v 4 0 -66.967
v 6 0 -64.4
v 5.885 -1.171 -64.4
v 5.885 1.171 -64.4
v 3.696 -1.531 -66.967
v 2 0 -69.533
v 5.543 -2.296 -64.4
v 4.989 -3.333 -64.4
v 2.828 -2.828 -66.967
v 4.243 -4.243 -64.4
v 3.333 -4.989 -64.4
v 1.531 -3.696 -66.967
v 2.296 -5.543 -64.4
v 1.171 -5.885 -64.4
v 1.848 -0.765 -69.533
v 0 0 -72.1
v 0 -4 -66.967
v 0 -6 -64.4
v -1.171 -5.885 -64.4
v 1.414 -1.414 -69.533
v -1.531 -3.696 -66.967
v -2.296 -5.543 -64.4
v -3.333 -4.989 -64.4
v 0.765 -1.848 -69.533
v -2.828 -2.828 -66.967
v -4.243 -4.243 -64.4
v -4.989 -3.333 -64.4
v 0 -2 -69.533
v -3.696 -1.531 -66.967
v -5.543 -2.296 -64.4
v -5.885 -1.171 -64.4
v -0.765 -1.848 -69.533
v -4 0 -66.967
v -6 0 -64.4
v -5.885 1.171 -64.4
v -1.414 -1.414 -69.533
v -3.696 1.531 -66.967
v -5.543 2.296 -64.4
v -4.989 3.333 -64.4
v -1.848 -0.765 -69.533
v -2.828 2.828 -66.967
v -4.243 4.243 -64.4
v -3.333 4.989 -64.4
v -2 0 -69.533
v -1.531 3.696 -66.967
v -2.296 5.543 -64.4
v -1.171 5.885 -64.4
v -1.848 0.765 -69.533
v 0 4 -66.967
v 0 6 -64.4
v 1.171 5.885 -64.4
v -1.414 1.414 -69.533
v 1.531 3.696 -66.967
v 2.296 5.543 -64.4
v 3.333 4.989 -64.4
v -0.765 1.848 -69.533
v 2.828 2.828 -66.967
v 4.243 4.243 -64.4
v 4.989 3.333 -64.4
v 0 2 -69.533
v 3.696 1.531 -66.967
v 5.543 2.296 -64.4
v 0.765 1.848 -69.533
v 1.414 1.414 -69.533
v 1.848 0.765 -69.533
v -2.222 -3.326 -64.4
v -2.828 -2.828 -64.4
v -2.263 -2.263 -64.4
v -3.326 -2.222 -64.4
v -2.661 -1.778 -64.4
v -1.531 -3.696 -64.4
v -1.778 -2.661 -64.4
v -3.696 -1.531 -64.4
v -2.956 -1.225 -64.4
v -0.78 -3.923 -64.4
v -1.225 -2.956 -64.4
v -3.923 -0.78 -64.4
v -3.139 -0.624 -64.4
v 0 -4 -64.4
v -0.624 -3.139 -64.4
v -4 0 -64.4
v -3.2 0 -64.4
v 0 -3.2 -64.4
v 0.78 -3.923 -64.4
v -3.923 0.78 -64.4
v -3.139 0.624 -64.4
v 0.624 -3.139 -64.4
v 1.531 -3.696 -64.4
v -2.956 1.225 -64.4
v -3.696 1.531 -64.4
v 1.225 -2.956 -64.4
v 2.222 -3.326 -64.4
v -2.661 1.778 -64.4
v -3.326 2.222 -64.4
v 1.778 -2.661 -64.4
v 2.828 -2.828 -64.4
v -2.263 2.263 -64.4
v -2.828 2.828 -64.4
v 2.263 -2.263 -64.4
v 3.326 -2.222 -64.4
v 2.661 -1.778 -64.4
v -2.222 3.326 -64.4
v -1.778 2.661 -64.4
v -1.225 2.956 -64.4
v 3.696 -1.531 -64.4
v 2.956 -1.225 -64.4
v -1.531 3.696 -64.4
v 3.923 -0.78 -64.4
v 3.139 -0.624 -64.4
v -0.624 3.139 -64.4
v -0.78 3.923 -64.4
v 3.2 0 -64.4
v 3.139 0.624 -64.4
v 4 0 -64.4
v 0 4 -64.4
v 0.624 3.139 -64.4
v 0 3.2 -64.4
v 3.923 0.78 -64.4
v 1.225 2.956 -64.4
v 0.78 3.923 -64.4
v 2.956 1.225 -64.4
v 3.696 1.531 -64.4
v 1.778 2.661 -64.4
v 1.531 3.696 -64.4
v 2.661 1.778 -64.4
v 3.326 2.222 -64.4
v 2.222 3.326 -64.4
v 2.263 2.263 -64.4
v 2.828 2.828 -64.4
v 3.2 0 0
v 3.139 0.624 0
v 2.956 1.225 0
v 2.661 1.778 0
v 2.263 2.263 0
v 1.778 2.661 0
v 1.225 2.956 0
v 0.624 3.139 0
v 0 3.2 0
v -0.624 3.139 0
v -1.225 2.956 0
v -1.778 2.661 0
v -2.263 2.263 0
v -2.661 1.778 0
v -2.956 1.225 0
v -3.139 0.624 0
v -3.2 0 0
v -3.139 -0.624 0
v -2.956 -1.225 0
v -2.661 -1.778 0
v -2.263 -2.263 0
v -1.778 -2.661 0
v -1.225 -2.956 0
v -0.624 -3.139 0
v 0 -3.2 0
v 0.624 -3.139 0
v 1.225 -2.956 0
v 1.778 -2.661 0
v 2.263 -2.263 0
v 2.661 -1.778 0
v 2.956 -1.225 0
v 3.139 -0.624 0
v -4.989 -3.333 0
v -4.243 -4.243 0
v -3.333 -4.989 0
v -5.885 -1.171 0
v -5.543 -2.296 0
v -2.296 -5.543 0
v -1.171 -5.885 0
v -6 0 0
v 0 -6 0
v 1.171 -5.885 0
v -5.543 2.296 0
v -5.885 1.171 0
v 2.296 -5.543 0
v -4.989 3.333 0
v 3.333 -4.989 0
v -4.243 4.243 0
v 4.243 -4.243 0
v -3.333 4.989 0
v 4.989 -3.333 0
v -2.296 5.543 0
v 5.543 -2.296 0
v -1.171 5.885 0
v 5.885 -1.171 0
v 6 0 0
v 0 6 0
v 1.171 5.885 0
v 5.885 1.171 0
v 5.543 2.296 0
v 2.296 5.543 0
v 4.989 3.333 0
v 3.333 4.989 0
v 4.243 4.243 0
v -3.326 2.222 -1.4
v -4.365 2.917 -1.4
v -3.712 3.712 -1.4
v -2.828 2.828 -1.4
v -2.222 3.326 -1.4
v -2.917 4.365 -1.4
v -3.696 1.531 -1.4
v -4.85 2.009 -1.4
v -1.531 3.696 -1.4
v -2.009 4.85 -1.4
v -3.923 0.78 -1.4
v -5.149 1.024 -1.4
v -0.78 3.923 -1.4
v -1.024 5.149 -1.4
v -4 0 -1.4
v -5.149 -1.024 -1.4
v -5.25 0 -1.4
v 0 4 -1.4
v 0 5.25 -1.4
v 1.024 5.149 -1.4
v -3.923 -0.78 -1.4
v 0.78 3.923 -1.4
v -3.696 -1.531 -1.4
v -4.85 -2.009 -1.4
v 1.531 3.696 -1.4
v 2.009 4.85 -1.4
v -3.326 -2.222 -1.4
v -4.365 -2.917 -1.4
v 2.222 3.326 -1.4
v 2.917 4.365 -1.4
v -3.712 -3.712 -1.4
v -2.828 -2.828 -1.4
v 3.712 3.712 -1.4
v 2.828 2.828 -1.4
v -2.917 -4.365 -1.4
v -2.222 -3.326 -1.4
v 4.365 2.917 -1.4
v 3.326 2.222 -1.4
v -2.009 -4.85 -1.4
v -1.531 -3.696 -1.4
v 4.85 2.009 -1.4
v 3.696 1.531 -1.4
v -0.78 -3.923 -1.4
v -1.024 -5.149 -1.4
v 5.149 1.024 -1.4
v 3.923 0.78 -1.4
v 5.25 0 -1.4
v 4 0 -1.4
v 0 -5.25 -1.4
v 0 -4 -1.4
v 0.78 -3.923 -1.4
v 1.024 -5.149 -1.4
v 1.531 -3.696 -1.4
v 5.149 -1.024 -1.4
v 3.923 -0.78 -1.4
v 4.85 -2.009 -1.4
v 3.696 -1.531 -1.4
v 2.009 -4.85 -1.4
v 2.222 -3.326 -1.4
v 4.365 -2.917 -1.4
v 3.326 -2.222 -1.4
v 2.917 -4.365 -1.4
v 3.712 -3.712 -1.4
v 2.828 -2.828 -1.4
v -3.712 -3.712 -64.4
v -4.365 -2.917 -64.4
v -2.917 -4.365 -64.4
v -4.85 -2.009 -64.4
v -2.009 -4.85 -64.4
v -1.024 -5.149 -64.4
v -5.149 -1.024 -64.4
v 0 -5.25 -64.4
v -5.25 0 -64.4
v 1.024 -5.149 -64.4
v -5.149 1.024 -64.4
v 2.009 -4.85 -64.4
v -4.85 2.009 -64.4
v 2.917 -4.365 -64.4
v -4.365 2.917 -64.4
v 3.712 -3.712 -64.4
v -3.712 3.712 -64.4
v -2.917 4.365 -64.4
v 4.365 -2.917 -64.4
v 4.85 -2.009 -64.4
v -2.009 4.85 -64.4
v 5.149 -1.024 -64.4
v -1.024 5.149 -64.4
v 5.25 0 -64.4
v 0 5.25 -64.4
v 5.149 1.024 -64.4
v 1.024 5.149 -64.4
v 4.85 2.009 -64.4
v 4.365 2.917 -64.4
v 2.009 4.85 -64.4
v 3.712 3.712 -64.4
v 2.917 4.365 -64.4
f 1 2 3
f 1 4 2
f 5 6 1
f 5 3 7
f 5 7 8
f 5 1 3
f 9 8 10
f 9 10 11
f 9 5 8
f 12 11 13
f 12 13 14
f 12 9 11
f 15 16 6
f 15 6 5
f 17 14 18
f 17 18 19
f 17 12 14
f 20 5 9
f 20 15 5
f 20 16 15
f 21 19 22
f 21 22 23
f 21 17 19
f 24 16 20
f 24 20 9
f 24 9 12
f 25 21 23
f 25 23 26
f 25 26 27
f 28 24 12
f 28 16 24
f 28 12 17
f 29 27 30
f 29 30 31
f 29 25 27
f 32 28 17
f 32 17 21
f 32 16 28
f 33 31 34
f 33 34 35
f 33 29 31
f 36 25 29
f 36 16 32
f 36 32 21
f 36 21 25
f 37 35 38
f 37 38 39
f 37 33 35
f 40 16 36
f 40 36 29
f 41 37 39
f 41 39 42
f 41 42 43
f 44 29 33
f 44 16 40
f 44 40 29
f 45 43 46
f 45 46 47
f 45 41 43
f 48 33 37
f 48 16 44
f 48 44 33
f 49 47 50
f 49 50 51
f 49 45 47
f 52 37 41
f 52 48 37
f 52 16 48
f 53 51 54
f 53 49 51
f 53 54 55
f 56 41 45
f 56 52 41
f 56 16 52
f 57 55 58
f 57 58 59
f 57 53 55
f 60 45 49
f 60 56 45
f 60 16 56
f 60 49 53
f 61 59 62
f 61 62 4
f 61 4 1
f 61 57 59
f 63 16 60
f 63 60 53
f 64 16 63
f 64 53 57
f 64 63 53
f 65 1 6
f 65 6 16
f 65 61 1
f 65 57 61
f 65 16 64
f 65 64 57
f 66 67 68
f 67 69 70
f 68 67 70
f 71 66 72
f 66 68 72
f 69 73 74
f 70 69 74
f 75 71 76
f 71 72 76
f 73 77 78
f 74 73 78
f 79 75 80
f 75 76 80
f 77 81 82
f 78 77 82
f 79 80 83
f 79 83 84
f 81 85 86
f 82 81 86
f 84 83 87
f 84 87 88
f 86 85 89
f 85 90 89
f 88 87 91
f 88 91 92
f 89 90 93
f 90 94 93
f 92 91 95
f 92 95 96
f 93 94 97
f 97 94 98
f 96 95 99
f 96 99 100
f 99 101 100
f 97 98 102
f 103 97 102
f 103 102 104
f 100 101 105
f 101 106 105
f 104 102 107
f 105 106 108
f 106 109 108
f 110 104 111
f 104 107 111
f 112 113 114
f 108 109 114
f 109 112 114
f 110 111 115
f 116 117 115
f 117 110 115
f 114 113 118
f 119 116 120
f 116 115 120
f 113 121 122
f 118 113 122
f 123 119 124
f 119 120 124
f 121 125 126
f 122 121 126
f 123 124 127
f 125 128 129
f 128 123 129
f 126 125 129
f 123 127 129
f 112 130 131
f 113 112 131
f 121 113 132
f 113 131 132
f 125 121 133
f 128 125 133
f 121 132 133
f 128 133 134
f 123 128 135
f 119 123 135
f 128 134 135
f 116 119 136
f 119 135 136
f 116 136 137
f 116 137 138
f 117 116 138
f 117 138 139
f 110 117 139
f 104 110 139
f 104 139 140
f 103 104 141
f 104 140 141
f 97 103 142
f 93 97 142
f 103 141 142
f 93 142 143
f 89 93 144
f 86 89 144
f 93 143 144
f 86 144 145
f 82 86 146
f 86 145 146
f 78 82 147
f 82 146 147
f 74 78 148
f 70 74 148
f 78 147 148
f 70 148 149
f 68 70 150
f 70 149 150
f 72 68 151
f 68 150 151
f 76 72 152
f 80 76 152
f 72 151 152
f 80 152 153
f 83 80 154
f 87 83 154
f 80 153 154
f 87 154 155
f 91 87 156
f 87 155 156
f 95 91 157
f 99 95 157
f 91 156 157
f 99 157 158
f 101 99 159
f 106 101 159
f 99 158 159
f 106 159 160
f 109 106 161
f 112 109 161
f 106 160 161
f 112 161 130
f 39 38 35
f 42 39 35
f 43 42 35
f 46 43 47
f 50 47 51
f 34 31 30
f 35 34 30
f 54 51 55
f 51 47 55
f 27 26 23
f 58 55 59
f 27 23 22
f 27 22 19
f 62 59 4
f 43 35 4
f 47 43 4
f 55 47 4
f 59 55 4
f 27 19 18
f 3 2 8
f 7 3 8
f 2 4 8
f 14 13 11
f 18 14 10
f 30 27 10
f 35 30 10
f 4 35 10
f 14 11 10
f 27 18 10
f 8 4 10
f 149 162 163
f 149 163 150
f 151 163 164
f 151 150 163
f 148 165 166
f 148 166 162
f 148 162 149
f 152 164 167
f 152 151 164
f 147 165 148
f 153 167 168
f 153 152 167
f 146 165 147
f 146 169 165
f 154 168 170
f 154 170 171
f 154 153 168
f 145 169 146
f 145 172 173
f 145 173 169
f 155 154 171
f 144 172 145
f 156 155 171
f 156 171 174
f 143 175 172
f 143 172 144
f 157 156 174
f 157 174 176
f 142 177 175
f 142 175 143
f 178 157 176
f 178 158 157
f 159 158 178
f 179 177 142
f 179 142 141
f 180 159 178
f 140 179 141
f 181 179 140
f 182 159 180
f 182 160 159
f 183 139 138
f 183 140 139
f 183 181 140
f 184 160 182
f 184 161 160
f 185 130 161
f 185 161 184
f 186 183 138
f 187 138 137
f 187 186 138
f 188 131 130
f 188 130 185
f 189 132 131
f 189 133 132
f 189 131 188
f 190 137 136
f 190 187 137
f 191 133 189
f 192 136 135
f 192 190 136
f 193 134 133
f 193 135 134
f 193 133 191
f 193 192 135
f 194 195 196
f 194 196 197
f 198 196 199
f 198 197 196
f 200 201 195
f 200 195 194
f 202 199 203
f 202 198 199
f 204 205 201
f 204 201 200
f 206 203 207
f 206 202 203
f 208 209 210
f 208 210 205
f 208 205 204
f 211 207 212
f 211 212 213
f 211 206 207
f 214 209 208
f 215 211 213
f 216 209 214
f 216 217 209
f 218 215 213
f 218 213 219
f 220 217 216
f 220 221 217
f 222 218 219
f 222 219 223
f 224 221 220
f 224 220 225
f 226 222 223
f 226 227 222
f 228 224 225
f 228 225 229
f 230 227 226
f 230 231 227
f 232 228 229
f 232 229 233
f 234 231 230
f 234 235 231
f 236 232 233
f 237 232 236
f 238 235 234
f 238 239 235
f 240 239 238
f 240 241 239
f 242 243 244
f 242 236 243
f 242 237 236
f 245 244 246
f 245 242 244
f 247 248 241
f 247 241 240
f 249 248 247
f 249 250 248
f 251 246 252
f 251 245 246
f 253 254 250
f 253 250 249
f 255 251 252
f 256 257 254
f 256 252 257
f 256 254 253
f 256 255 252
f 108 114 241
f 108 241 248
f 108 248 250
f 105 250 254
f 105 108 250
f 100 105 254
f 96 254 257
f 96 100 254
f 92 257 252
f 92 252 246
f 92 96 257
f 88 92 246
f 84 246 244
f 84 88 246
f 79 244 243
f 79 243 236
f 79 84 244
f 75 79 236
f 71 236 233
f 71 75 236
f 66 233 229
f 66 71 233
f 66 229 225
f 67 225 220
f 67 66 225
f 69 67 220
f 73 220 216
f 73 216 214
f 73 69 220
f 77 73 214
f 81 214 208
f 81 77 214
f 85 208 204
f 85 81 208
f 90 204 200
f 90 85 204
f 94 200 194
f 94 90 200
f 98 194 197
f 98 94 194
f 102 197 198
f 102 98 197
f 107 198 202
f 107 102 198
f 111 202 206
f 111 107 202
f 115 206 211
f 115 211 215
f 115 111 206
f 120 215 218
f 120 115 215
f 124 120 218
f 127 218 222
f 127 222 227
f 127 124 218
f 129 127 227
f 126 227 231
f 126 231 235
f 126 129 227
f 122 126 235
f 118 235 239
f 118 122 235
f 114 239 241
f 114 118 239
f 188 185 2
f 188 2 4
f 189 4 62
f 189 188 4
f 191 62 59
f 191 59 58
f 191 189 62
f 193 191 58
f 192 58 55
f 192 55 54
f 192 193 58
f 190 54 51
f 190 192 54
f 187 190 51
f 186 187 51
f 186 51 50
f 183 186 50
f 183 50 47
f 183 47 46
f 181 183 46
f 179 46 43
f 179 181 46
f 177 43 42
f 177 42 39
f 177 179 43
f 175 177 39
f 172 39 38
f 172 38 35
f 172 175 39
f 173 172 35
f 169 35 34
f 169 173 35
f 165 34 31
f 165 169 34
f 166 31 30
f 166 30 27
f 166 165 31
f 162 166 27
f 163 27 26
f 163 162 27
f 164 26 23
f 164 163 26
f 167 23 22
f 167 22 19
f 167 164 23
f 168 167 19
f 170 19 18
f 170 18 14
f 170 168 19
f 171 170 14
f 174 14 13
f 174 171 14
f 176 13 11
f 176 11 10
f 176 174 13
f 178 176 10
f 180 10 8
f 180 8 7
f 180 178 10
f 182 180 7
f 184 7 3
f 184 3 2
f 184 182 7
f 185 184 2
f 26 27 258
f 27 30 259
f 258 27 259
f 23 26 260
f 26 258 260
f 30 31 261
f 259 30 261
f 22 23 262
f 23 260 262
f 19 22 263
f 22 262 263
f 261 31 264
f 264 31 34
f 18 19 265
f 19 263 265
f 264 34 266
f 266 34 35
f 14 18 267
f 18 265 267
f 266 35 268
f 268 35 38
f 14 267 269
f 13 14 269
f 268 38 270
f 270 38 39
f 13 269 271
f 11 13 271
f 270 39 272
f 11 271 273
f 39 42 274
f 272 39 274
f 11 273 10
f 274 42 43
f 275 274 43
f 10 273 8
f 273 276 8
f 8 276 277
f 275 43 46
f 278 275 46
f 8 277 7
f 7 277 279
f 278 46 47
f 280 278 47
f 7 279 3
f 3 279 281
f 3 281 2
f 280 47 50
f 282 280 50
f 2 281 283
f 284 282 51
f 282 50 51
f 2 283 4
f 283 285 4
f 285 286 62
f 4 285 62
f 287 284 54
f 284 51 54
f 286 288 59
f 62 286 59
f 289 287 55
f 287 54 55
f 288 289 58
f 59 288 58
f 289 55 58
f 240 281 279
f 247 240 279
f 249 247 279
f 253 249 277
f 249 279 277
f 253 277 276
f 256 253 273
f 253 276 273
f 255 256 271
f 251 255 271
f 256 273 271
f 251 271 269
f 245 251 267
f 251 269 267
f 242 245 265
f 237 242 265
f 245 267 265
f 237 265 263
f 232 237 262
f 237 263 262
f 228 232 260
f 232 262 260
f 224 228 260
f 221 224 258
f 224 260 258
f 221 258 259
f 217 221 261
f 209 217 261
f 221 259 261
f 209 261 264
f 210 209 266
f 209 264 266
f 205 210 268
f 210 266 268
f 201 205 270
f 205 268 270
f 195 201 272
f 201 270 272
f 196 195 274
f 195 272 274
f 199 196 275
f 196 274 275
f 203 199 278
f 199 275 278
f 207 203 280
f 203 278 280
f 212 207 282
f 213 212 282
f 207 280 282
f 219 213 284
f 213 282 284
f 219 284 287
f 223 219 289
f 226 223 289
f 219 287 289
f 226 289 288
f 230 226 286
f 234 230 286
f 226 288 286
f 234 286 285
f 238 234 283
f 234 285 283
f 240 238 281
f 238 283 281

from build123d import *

# Parameters (mm, degrees)
F0_R     = 6
F0_R_2   = 3.2
F1_DEPTH = 64.4
F2_R     = 5.25
F2_R_2   = 4
F3_DEPTH = 63
F4_R     = 6
F4_R_2   = 5.25
F4_R_3   = 3.2
F5_DEPTH = 7.7
F6_R     = 3.2
F7_DEPTH = 7.7


# Not quite as in the source:
# - a fillet or chamfer that OpenCascade refuses, or shapes differently, is made with other operations: its cross-section is extruded or revolved along the edge and cut away or added


with BuildPart() as f1:
    # F0 (on Top) → F1 (new body)
    with BuildSketch(Plane.XY):
        Circle(F0_R)
        Circle(F0_R_2, mode=Mode.SUBTRACT)
    extrude(amount=-F1_DEPTH)

    # F2 (on face) → F3 (cut)
    with BuildSketch(Plane(origin=(0, 0, -64.4), x_dir=(1, 0, 0), z_dir=(0, 0, -1))):
        Circle(F2_R)
        Circle(F2_R_2, mode=Mode.SUBTRACT)
    extrude(amount=-F3_DEPTH, mode=Mode.SUBTRACT)


with BuildPart() as f5:
    # F4 (on face) → F5 (new body)
    with BuildSketch(Plane(origin=(0, 0, -64.4), x_dir=(1, 0, 0), z_dir=(0, 0, -1))):
        Circle(F4_R)
        Circle(F4_R_2, mode=Mode.SUBTRACT)
        Circle(F4_R_2)
        Circle(F4_R_3, mode=Mode.SUBTRACT)
    extrude(amount=F5_DEPTH)

    # F6 (on face) → F7 (join)
    with BuildSketch(Plane(origin=(0, 0, -72.1), x_dir=(1, 0, 0), z_dir=(0, 0, -1))):
        Circle(F6_R)
    extrude(amount=-F7_DEPTH)

    # F8: chamfer of 7.7 x 6 on 1 edges, made by hand

    # F8_s1 → F8_t2 (revolve, cut)
    with BuildSketch(Plane.XZ):
        Polygon((6, -64.4), (0, -72.1), (6, -72.1), align=None)
    revolve(axis=Axis((0, 0, -72.1), (0, 0, -1)), mode=Mode.SUBTRACT)


solid = Compound([f1.part, f5.part])
